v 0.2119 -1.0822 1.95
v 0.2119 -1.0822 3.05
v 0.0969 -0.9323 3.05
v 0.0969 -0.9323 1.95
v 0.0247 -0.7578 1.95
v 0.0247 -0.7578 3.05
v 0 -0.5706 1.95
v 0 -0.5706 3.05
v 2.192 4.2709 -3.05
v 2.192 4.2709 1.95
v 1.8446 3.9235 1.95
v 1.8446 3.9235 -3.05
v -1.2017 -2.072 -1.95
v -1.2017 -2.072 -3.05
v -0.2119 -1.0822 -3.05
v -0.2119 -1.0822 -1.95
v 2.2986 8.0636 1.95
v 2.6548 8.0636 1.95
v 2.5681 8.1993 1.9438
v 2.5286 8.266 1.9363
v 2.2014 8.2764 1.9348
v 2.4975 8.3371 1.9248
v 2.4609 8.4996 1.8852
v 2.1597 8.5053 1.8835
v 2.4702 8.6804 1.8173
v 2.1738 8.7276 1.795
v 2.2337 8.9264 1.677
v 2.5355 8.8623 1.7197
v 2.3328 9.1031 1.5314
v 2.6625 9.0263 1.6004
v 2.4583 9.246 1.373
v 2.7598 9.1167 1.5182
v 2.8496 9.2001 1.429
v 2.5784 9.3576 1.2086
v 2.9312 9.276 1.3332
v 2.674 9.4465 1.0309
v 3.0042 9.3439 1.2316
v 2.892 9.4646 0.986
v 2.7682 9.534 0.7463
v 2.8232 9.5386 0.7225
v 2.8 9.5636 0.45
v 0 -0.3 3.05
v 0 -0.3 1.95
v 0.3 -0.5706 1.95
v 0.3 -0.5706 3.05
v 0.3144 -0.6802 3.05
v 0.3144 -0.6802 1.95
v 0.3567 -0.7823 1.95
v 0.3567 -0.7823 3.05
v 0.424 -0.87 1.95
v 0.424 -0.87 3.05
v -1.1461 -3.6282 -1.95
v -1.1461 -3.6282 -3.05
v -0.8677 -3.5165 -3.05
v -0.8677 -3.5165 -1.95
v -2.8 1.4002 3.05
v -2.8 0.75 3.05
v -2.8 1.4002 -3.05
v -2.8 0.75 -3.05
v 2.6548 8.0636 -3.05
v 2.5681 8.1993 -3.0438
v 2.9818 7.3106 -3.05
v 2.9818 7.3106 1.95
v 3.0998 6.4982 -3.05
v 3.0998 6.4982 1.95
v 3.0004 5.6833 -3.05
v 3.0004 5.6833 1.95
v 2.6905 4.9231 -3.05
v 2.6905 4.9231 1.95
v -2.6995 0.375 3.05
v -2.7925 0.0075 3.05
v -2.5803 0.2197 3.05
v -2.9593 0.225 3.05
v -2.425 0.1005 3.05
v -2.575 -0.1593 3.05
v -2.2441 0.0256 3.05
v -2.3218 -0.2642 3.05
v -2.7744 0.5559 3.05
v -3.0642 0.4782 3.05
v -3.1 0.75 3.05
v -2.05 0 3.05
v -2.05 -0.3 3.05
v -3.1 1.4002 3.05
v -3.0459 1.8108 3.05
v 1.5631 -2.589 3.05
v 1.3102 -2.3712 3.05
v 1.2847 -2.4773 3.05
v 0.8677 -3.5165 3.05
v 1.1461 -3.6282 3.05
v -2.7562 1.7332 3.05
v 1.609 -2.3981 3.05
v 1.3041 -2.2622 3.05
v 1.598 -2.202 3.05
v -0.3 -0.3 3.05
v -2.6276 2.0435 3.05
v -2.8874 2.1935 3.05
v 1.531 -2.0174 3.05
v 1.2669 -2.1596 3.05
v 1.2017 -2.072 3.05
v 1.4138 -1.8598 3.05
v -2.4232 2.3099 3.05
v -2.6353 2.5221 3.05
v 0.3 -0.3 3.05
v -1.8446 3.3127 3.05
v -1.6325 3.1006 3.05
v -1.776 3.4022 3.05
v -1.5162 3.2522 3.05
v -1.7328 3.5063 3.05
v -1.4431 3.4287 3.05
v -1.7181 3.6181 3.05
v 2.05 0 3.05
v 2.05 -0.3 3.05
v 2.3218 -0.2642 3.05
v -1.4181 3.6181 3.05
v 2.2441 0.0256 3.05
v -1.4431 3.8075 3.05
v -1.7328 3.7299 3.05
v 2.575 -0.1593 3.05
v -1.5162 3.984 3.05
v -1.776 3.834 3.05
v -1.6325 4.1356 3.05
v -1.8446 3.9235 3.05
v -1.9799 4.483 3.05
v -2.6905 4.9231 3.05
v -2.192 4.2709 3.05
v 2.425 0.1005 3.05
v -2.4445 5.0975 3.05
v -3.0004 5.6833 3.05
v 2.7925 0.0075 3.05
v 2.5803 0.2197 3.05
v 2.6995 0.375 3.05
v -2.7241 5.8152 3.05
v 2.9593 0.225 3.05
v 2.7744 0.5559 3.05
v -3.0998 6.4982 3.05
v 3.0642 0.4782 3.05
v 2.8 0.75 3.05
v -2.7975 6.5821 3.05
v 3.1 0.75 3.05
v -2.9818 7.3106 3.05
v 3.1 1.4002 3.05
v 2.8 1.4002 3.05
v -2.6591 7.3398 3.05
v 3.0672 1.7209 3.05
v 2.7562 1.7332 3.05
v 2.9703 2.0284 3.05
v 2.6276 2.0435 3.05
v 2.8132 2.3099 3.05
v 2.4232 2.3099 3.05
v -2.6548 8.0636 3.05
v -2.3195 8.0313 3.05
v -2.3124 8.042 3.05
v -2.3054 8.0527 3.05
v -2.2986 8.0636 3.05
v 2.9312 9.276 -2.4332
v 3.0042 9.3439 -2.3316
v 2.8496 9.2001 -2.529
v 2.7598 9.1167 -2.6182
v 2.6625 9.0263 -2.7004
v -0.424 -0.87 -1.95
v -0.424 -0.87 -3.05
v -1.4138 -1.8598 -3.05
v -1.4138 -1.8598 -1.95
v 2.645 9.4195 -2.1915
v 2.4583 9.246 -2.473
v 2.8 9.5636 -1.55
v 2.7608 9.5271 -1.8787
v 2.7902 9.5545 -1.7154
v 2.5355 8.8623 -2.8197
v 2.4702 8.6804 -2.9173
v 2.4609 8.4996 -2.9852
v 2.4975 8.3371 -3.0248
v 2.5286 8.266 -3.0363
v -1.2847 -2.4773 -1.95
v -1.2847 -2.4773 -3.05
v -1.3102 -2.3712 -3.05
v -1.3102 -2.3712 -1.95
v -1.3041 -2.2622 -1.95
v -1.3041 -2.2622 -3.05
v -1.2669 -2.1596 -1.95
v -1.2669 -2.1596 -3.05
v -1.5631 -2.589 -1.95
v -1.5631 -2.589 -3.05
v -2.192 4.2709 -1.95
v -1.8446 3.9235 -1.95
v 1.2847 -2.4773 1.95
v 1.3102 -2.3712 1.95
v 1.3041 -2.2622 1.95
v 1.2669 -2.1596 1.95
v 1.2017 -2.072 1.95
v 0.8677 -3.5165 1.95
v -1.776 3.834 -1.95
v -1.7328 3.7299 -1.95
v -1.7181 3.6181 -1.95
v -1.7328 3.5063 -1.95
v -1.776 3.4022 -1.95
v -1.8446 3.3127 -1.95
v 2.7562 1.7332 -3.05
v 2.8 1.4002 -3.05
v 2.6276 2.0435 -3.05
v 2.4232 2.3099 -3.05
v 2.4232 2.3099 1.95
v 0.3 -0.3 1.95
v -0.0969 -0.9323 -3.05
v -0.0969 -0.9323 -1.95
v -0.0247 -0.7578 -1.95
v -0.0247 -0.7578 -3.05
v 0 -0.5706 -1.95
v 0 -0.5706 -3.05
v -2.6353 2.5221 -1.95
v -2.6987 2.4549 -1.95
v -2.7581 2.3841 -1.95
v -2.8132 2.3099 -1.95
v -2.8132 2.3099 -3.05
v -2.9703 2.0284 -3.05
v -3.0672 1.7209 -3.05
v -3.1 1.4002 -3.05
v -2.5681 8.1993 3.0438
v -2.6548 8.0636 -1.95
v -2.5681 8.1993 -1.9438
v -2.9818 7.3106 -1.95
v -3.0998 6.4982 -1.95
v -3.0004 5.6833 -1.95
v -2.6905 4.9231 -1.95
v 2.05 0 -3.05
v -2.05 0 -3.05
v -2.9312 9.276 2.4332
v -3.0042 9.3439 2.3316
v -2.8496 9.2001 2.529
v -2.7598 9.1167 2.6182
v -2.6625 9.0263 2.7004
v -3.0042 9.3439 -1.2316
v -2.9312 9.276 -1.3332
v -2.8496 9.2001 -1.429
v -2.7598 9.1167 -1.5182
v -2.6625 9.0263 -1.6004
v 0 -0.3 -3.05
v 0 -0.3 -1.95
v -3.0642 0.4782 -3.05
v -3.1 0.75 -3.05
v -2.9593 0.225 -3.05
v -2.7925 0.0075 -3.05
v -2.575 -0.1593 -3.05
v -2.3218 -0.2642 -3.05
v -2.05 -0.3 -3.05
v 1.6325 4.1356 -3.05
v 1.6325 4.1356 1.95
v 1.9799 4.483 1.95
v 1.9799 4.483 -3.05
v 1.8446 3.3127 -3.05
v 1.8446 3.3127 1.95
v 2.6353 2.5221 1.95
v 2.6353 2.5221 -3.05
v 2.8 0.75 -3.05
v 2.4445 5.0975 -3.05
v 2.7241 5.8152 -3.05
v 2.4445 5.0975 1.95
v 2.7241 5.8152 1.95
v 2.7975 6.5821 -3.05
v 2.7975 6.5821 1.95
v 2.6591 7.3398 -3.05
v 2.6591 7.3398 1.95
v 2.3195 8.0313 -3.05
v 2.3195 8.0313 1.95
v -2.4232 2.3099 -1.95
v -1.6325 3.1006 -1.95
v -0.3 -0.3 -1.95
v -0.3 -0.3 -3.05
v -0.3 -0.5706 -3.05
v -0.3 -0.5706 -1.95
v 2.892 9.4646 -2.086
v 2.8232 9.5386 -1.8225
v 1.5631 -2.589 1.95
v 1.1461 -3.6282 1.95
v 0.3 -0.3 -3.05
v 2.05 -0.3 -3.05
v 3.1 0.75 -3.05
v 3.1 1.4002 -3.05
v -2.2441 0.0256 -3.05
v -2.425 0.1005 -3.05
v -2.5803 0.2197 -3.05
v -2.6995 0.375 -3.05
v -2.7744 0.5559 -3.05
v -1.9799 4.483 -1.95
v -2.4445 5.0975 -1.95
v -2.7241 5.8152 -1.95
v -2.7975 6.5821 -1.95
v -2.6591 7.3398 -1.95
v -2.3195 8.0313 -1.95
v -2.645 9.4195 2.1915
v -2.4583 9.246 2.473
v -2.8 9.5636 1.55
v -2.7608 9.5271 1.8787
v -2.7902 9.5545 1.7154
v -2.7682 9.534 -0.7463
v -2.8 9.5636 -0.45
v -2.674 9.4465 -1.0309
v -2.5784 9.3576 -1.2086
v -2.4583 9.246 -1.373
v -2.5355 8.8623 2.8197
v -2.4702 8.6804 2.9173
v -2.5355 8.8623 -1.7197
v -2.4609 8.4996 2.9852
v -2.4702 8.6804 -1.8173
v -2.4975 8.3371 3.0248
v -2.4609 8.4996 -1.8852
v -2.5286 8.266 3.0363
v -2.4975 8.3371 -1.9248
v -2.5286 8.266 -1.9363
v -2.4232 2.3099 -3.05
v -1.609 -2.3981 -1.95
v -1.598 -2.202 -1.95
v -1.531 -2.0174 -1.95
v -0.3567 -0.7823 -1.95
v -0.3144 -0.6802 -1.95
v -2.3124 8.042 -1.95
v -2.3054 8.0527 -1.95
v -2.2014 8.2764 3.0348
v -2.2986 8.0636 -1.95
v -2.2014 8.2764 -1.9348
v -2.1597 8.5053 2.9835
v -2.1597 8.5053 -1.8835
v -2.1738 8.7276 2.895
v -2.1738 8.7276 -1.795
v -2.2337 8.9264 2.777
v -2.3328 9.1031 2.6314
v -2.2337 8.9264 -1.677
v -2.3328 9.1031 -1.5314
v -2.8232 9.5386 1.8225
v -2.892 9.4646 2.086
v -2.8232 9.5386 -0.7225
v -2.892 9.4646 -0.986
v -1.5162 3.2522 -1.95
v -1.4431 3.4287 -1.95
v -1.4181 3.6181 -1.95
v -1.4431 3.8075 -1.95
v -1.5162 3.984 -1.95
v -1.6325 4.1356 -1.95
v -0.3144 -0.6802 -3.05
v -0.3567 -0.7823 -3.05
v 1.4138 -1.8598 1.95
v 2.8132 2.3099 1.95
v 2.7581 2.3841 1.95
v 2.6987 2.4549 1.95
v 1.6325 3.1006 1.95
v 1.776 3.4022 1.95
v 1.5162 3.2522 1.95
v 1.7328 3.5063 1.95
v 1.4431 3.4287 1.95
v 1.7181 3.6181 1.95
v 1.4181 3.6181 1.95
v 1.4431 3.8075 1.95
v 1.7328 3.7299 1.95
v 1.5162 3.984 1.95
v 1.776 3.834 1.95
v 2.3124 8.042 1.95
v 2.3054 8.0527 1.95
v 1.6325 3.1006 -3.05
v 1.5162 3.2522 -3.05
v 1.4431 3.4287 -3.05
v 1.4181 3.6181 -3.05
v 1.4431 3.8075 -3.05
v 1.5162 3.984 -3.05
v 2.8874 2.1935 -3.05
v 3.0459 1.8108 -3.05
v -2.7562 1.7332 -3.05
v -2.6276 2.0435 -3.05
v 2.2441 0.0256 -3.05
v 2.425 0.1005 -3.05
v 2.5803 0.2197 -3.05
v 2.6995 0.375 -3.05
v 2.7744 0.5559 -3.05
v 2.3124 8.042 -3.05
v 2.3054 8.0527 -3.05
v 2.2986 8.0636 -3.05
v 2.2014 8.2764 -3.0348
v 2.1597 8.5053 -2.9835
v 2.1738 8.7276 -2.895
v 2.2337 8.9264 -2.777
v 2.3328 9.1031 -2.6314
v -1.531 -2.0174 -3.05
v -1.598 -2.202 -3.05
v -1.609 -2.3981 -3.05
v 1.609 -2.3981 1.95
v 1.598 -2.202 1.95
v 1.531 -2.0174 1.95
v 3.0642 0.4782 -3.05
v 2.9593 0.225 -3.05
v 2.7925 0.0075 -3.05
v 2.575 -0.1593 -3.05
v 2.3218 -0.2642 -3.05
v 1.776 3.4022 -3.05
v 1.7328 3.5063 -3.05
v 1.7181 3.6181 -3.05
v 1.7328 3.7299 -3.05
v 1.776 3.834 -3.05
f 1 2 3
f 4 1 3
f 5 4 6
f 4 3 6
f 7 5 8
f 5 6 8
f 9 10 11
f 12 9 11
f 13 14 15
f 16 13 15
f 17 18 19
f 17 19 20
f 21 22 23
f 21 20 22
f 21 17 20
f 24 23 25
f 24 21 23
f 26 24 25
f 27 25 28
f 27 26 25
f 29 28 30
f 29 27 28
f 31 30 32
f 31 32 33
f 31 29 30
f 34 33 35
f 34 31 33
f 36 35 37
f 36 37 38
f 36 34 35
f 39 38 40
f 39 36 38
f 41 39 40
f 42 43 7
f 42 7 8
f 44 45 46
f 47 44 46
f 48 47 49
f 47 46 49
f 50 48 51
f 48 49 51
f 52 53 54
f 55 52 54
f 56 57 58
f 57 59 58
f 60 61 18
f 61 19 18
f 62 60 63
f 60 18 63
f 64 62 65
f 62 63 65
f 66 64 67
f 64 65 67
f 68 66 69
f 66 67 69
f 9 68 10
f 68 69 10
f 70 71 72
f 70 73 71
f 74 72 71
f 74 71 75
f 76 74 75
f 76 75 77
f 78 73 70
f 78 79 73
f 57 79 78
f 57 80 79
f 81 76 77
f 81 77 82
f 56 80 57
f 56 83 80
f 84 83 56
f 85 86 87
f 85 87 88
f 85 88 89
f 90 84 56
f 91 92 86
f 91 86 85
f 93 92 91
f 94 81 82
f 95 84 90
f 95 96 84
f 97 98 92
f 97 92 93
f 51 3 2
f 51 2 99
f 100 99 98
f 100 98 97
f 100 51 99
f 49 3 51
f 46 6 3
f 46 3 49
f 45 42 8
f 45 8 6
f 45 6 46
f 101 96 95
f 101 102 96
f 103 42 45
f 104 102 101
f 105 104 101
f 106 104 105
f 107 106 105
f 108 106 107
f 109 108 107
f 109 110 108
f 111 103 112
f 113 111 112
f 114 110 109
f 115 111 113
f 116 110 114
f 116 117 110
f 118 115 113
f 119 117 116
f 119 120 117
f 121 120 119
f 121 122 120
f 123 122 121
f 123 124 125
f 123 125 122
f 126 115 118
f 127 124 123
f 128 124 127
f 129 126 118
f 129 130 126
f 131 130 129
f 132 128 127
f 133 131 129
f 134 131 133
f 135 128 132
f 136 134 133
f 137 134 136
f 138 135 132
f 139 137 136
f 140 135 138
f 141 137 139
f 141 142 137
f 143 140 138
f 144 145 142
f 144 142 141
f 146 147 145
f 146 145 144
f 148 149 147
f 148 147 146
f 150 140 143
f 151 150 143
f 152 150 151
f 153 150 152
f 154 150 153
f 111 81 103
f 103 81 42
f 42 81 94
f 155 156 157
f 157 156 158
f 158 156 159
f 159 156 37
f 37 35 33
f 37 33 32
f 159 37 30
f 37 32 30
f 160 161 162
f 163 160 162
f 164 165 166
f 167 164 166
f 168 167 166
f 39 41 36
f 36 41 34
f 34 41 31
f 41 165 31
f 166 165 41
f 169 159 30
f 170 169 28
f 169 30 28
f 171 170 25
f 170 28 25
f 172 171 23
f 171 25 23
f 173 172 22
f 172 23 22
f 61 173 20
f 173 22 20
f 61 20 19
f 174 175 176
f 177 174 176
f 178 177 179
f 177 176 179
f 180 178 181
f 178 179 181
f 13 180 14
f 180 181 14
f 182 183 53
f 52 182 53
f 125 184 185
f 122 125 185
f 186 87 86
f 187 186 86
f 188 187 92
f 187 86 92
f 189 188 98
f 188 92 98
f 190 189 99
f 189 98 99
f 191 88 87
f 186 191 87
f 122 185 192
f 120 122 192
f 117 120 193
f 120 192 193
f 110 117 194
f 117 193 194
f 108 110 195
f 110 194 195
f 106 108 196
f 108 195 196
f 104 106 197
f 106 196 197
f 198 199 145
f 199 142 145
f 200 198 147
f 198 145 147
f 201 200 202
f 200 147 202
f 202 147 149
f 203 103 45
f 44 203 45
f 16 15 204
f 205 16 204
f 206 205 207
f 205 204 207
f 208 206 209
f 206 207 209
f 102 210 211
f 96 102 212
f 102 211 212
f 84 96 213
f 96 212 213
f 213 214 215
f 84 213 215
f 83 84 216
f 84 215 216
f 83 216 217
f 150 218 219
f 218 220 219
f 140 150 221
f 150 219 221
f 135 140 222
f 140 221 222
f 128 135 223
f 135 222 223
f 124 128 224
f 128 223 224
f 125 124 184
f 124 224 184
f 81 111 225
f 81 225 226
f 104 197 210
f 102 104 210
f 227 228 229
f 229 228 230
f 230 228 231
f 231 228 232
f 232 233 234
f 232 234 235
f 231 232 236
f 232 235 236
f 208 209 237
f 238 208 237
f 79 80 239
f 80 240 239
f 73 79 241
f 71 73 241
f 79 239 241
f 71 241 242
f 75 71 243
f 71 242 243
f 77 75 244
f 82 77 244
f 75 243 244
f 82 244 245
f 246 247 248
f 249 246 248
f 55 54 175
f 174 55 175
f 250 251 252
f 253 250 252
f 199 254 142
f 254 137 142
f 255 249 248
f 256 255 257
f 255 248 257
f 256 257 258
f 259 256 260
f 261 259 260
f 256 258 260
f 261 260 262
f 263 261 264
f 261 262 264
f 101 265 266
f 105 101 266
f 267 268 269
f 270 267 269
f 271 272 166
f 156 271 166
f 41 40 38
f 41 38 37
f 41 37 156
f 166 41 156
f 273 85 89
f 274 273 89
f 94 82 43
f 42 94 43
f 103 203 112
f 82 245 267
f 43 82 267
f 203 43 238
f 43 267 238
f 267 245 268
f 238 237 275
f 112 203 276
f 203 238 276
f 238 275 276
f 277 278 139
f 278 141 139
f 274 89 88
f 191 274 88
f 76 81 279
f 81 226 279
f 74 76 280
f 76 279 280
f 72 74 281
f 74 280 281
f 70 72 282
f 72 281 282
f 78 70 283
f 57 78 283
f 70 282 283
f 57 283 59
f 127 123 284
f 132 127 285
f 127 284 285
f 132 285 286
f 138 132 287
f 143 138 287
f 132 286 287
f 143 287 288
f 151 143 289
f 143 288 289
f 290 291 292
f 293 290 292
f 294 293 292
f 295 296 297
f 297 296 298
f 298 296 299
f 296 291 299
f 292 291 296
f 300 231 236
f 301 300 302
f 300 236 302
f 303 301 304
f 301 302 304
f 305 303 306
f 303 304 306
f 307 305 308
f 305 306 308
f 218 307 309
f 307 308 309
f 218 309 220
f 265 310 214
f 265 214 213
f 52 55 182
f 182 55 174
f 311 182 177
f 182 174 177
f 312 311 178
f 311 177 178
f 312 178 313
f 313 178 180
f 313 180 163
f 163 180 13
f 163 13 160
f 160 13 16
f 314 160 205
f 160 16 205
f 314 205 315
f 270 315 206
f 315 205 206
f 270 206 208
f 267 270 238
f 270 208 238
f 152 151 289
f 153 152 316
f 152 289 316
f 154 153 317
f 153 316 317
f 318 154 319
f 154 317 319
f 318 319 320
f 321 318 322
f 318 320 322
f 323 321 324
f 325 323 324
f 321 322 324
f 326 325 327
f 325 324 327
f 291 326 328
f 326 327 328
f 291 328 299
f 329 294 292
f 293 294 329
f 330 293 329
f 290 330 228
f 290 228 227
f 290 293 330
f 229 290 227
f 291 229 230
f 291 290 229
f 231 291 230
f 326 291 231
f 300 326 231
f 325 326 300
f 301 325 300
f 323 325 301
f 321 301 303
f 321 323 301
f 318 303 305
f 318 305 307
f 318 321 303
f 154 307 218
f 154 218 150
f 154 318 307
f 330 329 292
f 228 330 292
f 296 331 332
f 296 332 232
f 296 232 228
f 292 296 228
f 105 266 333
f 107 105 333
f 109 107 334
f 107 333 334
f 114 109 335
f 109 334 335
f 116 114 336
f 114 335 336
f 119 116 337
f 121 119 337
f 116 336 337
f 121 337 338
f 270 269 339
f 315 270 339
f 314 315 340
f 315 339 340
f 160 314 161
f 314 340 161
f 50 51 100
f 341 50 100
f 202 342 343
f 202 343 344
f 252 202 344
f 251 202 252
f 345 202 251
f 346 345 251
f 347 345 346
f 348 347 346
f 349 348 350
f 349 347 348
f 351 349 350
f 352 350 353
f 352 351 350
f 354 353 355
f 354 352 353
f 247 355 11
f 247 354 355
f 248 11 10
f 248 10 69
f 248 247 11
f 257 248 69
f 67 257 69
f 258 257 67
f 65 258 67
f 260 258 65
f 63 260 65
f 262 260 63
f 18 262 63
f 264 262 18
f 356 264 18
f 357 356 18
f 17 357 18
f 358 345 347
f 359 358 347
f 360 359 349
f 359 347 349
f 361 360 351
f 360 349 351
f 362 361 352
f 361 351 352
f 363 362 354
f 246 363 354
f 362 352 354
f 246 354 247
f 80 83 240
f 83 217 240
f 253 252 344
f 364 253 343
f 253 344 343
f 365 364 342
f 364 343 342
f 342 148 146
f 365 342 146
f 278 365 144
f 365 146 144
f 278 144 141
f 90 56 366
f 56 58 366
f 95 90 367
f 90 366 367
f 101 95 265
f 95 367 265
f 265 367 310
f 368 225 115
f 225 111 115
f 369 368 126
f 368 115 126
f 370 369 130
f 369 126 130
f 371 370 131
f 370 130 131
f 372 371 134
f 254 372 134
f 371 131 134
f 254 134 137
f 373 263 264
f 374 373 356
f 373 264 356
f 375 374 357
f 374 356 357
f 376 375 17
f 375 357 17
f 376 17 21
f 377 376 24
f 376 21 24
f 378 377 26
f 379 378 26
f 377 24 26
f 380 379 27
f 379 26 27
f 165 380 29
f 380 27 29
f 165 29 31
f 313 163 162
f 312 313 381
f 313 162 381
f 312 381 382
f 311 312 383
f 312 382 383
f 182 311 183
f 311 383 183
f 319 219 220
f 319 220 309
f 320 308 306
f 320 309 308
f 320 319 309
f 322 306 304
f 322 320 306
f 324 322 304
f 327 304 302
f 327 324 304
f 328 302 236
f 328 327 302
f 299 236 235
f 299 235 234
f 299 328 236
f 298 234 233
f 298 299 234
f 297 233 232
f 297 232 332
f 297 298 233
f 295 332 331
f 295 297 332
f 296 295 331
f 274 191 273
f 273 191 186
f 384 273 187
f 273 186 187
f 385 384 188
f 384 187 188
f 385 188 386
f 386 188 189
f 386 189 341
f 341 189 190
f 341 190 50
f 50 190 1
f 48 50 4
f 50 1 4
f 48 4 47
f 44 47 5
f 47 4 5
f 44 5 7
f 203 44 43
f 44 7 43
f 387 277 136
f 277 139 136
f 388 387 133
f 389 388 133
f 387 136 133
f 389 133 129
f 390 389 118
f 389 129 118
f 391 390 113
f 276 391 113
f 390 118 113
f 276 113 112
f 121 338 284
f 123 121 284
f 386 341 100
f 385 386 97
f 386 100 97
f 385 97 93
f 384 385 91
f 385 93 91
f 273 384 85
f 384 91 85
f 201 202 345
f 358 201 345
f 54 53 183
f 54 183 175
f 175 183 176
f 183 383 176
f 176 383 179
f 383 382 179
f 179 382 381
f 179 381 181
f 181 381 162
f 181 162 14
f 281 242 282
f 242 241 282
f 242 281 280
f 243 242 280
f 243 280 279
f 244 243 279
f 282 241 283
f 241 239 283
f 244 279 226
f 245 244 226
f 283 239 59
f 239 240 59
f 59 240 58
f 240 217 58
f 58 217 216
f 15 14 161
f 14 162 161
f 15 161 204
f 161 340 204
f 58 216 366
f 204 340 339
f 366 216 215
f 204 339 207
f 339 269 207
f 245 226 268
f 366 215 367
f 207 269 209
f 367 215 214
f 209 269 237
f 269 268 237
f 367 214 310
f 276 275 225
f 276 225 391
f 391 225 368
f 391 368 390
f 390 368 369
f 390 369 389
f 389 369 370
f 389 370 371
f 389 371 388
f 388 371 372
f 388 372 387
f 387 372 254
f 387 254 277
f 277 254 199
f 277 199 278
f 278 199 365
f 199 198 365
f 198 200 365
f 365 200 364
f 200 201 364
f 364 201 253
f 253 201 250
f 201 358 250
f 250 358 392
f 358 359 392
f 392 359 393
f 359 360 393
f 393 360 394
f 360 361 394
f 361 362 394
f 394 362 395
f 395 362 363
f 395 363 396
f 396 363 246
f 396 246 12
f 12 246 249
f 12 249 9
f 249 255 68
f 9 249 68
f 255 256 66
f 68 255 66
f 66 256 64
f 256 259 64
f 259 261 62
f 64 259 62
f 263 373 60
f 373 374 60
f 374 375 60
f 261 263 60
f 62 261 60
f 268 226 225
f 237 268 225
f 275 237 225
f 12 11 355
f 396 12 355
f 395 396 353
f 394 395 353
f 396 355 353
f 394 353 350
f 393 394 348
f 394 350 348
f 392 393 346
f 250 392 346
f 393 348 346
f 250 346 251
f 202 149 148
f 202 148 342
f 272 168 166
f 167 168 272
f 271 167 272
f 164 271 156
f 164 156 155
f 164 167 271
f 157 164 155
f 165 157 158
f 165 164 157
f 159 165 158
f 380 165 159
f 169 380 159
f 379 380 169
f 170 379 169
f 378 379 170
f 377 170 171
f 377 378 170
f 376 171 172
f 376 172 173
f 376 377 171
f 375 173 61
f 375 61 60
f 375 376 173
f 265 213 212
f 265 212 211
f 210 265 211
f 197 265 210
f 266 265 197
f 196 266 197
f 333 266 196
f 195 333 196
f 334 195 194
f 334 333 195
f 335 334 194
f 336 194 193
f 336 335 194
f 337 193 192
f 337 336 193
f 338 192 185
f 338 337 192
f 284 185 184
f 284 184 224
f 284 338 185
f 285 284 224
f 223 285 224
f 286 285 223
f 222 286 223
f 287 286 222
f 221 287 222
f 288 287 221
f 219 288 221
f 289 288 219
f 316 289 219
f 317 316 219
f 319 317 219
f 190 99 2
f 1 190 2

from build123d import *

# Parameters (mm, degrees)
EXTRU_MINCE1_DEPTH           = 3.05
ESQUISSE3_W                  = 5
ESQUISSE3_H                  = 3.328220353
ENL_V_MAT_EXTRU_1_DEPTH      = 10
R_P_TITION_CIRCULAIRE1_COUNT = 2


with BuildPart() as part:
    # Esquisse2 → Extru.-Mince1 (new, symmetric)
    with BuildSketch(Plane.XY):
        with BuildLine():
            Line((0.867691044, -3.516497462), (1.284684178, -2.477324095))
            ThreePointArc((1.284684178, -2.477324095), (1.304066655, -2.262192987), (1.201715788, -2.071978966))
            Line((1.201715788, -2.071978966), (0.211890589, -1.082153766))
            ThreePointArc((0.211890589, -1.082153766), (0.05506857, -0.847453029), (0, -0.570604633))
            Line((0, -0.570604633), (0, 0))
            Line((0, 0), (2.05, 0))
            ThreePointArc((2.05, 0), (2.580330086, 0.219669914), (2.8, 0.75))
            Line((2.8, 0.75), (2.8, 1.400152821))
            ThreePointArc((2.8, 1.400152821), (2.702061046, 1.892525191), (2.423154503, 2.309938332))
            Line((2.423154503, 2.309938332), (1.63248823, 3.100604604))
            ThreePointArc((1.63248823, 3.100604604), (1.418134189, 3.618101038), (1.63248823, 4.135597473))
            Line((1.63248823, 4.135597473), (1.979898987, 4.48300823))
            ThreePointArc((1.979898987, 4.48300823), (2.787260417, 6.196112604), (2.31953586, 8.031267314))
            ThreePointArc((2.31953586, 8.031267314), (2.164350637, 8.664278157), (2.458268281, 9.245997676))
            Line((2.458268281, 9.245997676), (2.8, 9.563603836))
            Line((2.8, 9.563603836), (3.004233324, 9.343856824))
            Line((3.004233324, 9.343856824), (2.662501605, 9.026250664))
            ThreePointArc((2.662501605, 9.026250664), (2.462413038, 8.630236925), (2.568057559, 8.199305896))
            ThreePointArc((2.568057559, 8.199305896), (3.085895462, 6.167527467), (2.192031022, 4.270876196))
            Line((2.192031022, 4.270876196), (1.844620265, 3.923465439))
            ThreePointArc((1.844620265, 3.923465439), (1.718134189, 3.618101038), (1.844620265, 3.312736638))
            Line((1.844620265, 3.312736638), (2.635286537, 2.522070366))
            ThreePointArc((2.635286537, 2.522070366), (2.979224906, 2.007330221), (3.1, 1.400152821))
            Line((3.1, 1.400152821), (3.1, 0.75))
            ThreePointArc((3.1, 0.75), (2.79246212, 0.00753788), (2.05, -0.3))
            Line((2.05, -0.3), (0.3, -0.3))
            Line((0.3, -0.3), (0.3, -0.570604633))
            ThreePointArc((0.3, -0.570604633), (0.33223243, -0.732648), (0.424022623, -0.870021732))
            Line((0.424022623, -0.870021732), (1.413847823, -1.859846932))
            ThreePointArc((1.413847823, -1.859846932), (1.597973034, -2.202034526), (1.563104716, -2.589046986))
            Line((1.563104716, -2.589046986), (1.146111581, -3.628220353))
            Line((1.146111581, -3.628220353), (0.867691044, -3.516497462))
        make_face()
    extru_mince1 = extrude(amount=EXTRU_MINCE1_DEPTH, both=True)

    # Esquisse3 → Enlèv. mat.-Extru.1 (cut)
    with BuildSketch(Plane(origin=(0, 0, 0), x_dir=(0, 0, -1), z_dir=(1, 0, 0))):
        with Locations((0.55, -1.964110177)):
            Rectangle(ESQUISSE3_W, ESQUISSE3_H)
        with BuildLine():
            Line((3.05, 9.563603836), (1.55, 9.563603836))
            ThreePointArc((1.55, 9.563603836), (2.610660172, 9.124264008), (3.05, 8.063603836))
            Line((3.05, 8.063603836), (3.05, 9.563603836))
        make_face()
        with BuildLine():
            Line((-0.45, 9.563603836), (-3.05, 9.563603836))
            Line((-3.05, 9.563603836), (-3.05, 2.309938332))
            Line((-3.05, 2.309938332), (-1.95, 2.309938332))
            Line((-1.95, 2.309938332), (-1.95, 8.063603836))
            ThreePointArc((-1.95, 8.063603836), (-1.510660172, 9.124264008), (-0.45, 9.563603836))
        make_face()
    enl_v_mat_extru_1 = extrude(amount=ENL_V_MAT_EXTRU_1_DEPTH, mode=Mode.SUBTRACT)

    # Répétition circulaire1: Extru.-Mince1, Enlèv. mat.-Extru.1 ×2 about axis
    r_p_tition_circulaire1_axis = Axis((0, -4.287811562, 0), (0, 1, 0))
    add([extru_mince1.rotate(r_p_tition_circulaire1_axis, i * 360 / R_P_TITION_CIRCULAIRE1_COUNT) for i in range(1, R_P_TITION_CIRCULAIRE1_COUNT)])
    add([enl_v_mat_extru_1.rotate(r_p_tition_circulaire1_axis, i * 360 / R_P_TITION_CIRCULAIRE1_COUNT) for i in range(1, R_P_TITION_CIRCULAIRE1_COUNT)], mode=Mode.SUBTRACT)


solid = part.part
